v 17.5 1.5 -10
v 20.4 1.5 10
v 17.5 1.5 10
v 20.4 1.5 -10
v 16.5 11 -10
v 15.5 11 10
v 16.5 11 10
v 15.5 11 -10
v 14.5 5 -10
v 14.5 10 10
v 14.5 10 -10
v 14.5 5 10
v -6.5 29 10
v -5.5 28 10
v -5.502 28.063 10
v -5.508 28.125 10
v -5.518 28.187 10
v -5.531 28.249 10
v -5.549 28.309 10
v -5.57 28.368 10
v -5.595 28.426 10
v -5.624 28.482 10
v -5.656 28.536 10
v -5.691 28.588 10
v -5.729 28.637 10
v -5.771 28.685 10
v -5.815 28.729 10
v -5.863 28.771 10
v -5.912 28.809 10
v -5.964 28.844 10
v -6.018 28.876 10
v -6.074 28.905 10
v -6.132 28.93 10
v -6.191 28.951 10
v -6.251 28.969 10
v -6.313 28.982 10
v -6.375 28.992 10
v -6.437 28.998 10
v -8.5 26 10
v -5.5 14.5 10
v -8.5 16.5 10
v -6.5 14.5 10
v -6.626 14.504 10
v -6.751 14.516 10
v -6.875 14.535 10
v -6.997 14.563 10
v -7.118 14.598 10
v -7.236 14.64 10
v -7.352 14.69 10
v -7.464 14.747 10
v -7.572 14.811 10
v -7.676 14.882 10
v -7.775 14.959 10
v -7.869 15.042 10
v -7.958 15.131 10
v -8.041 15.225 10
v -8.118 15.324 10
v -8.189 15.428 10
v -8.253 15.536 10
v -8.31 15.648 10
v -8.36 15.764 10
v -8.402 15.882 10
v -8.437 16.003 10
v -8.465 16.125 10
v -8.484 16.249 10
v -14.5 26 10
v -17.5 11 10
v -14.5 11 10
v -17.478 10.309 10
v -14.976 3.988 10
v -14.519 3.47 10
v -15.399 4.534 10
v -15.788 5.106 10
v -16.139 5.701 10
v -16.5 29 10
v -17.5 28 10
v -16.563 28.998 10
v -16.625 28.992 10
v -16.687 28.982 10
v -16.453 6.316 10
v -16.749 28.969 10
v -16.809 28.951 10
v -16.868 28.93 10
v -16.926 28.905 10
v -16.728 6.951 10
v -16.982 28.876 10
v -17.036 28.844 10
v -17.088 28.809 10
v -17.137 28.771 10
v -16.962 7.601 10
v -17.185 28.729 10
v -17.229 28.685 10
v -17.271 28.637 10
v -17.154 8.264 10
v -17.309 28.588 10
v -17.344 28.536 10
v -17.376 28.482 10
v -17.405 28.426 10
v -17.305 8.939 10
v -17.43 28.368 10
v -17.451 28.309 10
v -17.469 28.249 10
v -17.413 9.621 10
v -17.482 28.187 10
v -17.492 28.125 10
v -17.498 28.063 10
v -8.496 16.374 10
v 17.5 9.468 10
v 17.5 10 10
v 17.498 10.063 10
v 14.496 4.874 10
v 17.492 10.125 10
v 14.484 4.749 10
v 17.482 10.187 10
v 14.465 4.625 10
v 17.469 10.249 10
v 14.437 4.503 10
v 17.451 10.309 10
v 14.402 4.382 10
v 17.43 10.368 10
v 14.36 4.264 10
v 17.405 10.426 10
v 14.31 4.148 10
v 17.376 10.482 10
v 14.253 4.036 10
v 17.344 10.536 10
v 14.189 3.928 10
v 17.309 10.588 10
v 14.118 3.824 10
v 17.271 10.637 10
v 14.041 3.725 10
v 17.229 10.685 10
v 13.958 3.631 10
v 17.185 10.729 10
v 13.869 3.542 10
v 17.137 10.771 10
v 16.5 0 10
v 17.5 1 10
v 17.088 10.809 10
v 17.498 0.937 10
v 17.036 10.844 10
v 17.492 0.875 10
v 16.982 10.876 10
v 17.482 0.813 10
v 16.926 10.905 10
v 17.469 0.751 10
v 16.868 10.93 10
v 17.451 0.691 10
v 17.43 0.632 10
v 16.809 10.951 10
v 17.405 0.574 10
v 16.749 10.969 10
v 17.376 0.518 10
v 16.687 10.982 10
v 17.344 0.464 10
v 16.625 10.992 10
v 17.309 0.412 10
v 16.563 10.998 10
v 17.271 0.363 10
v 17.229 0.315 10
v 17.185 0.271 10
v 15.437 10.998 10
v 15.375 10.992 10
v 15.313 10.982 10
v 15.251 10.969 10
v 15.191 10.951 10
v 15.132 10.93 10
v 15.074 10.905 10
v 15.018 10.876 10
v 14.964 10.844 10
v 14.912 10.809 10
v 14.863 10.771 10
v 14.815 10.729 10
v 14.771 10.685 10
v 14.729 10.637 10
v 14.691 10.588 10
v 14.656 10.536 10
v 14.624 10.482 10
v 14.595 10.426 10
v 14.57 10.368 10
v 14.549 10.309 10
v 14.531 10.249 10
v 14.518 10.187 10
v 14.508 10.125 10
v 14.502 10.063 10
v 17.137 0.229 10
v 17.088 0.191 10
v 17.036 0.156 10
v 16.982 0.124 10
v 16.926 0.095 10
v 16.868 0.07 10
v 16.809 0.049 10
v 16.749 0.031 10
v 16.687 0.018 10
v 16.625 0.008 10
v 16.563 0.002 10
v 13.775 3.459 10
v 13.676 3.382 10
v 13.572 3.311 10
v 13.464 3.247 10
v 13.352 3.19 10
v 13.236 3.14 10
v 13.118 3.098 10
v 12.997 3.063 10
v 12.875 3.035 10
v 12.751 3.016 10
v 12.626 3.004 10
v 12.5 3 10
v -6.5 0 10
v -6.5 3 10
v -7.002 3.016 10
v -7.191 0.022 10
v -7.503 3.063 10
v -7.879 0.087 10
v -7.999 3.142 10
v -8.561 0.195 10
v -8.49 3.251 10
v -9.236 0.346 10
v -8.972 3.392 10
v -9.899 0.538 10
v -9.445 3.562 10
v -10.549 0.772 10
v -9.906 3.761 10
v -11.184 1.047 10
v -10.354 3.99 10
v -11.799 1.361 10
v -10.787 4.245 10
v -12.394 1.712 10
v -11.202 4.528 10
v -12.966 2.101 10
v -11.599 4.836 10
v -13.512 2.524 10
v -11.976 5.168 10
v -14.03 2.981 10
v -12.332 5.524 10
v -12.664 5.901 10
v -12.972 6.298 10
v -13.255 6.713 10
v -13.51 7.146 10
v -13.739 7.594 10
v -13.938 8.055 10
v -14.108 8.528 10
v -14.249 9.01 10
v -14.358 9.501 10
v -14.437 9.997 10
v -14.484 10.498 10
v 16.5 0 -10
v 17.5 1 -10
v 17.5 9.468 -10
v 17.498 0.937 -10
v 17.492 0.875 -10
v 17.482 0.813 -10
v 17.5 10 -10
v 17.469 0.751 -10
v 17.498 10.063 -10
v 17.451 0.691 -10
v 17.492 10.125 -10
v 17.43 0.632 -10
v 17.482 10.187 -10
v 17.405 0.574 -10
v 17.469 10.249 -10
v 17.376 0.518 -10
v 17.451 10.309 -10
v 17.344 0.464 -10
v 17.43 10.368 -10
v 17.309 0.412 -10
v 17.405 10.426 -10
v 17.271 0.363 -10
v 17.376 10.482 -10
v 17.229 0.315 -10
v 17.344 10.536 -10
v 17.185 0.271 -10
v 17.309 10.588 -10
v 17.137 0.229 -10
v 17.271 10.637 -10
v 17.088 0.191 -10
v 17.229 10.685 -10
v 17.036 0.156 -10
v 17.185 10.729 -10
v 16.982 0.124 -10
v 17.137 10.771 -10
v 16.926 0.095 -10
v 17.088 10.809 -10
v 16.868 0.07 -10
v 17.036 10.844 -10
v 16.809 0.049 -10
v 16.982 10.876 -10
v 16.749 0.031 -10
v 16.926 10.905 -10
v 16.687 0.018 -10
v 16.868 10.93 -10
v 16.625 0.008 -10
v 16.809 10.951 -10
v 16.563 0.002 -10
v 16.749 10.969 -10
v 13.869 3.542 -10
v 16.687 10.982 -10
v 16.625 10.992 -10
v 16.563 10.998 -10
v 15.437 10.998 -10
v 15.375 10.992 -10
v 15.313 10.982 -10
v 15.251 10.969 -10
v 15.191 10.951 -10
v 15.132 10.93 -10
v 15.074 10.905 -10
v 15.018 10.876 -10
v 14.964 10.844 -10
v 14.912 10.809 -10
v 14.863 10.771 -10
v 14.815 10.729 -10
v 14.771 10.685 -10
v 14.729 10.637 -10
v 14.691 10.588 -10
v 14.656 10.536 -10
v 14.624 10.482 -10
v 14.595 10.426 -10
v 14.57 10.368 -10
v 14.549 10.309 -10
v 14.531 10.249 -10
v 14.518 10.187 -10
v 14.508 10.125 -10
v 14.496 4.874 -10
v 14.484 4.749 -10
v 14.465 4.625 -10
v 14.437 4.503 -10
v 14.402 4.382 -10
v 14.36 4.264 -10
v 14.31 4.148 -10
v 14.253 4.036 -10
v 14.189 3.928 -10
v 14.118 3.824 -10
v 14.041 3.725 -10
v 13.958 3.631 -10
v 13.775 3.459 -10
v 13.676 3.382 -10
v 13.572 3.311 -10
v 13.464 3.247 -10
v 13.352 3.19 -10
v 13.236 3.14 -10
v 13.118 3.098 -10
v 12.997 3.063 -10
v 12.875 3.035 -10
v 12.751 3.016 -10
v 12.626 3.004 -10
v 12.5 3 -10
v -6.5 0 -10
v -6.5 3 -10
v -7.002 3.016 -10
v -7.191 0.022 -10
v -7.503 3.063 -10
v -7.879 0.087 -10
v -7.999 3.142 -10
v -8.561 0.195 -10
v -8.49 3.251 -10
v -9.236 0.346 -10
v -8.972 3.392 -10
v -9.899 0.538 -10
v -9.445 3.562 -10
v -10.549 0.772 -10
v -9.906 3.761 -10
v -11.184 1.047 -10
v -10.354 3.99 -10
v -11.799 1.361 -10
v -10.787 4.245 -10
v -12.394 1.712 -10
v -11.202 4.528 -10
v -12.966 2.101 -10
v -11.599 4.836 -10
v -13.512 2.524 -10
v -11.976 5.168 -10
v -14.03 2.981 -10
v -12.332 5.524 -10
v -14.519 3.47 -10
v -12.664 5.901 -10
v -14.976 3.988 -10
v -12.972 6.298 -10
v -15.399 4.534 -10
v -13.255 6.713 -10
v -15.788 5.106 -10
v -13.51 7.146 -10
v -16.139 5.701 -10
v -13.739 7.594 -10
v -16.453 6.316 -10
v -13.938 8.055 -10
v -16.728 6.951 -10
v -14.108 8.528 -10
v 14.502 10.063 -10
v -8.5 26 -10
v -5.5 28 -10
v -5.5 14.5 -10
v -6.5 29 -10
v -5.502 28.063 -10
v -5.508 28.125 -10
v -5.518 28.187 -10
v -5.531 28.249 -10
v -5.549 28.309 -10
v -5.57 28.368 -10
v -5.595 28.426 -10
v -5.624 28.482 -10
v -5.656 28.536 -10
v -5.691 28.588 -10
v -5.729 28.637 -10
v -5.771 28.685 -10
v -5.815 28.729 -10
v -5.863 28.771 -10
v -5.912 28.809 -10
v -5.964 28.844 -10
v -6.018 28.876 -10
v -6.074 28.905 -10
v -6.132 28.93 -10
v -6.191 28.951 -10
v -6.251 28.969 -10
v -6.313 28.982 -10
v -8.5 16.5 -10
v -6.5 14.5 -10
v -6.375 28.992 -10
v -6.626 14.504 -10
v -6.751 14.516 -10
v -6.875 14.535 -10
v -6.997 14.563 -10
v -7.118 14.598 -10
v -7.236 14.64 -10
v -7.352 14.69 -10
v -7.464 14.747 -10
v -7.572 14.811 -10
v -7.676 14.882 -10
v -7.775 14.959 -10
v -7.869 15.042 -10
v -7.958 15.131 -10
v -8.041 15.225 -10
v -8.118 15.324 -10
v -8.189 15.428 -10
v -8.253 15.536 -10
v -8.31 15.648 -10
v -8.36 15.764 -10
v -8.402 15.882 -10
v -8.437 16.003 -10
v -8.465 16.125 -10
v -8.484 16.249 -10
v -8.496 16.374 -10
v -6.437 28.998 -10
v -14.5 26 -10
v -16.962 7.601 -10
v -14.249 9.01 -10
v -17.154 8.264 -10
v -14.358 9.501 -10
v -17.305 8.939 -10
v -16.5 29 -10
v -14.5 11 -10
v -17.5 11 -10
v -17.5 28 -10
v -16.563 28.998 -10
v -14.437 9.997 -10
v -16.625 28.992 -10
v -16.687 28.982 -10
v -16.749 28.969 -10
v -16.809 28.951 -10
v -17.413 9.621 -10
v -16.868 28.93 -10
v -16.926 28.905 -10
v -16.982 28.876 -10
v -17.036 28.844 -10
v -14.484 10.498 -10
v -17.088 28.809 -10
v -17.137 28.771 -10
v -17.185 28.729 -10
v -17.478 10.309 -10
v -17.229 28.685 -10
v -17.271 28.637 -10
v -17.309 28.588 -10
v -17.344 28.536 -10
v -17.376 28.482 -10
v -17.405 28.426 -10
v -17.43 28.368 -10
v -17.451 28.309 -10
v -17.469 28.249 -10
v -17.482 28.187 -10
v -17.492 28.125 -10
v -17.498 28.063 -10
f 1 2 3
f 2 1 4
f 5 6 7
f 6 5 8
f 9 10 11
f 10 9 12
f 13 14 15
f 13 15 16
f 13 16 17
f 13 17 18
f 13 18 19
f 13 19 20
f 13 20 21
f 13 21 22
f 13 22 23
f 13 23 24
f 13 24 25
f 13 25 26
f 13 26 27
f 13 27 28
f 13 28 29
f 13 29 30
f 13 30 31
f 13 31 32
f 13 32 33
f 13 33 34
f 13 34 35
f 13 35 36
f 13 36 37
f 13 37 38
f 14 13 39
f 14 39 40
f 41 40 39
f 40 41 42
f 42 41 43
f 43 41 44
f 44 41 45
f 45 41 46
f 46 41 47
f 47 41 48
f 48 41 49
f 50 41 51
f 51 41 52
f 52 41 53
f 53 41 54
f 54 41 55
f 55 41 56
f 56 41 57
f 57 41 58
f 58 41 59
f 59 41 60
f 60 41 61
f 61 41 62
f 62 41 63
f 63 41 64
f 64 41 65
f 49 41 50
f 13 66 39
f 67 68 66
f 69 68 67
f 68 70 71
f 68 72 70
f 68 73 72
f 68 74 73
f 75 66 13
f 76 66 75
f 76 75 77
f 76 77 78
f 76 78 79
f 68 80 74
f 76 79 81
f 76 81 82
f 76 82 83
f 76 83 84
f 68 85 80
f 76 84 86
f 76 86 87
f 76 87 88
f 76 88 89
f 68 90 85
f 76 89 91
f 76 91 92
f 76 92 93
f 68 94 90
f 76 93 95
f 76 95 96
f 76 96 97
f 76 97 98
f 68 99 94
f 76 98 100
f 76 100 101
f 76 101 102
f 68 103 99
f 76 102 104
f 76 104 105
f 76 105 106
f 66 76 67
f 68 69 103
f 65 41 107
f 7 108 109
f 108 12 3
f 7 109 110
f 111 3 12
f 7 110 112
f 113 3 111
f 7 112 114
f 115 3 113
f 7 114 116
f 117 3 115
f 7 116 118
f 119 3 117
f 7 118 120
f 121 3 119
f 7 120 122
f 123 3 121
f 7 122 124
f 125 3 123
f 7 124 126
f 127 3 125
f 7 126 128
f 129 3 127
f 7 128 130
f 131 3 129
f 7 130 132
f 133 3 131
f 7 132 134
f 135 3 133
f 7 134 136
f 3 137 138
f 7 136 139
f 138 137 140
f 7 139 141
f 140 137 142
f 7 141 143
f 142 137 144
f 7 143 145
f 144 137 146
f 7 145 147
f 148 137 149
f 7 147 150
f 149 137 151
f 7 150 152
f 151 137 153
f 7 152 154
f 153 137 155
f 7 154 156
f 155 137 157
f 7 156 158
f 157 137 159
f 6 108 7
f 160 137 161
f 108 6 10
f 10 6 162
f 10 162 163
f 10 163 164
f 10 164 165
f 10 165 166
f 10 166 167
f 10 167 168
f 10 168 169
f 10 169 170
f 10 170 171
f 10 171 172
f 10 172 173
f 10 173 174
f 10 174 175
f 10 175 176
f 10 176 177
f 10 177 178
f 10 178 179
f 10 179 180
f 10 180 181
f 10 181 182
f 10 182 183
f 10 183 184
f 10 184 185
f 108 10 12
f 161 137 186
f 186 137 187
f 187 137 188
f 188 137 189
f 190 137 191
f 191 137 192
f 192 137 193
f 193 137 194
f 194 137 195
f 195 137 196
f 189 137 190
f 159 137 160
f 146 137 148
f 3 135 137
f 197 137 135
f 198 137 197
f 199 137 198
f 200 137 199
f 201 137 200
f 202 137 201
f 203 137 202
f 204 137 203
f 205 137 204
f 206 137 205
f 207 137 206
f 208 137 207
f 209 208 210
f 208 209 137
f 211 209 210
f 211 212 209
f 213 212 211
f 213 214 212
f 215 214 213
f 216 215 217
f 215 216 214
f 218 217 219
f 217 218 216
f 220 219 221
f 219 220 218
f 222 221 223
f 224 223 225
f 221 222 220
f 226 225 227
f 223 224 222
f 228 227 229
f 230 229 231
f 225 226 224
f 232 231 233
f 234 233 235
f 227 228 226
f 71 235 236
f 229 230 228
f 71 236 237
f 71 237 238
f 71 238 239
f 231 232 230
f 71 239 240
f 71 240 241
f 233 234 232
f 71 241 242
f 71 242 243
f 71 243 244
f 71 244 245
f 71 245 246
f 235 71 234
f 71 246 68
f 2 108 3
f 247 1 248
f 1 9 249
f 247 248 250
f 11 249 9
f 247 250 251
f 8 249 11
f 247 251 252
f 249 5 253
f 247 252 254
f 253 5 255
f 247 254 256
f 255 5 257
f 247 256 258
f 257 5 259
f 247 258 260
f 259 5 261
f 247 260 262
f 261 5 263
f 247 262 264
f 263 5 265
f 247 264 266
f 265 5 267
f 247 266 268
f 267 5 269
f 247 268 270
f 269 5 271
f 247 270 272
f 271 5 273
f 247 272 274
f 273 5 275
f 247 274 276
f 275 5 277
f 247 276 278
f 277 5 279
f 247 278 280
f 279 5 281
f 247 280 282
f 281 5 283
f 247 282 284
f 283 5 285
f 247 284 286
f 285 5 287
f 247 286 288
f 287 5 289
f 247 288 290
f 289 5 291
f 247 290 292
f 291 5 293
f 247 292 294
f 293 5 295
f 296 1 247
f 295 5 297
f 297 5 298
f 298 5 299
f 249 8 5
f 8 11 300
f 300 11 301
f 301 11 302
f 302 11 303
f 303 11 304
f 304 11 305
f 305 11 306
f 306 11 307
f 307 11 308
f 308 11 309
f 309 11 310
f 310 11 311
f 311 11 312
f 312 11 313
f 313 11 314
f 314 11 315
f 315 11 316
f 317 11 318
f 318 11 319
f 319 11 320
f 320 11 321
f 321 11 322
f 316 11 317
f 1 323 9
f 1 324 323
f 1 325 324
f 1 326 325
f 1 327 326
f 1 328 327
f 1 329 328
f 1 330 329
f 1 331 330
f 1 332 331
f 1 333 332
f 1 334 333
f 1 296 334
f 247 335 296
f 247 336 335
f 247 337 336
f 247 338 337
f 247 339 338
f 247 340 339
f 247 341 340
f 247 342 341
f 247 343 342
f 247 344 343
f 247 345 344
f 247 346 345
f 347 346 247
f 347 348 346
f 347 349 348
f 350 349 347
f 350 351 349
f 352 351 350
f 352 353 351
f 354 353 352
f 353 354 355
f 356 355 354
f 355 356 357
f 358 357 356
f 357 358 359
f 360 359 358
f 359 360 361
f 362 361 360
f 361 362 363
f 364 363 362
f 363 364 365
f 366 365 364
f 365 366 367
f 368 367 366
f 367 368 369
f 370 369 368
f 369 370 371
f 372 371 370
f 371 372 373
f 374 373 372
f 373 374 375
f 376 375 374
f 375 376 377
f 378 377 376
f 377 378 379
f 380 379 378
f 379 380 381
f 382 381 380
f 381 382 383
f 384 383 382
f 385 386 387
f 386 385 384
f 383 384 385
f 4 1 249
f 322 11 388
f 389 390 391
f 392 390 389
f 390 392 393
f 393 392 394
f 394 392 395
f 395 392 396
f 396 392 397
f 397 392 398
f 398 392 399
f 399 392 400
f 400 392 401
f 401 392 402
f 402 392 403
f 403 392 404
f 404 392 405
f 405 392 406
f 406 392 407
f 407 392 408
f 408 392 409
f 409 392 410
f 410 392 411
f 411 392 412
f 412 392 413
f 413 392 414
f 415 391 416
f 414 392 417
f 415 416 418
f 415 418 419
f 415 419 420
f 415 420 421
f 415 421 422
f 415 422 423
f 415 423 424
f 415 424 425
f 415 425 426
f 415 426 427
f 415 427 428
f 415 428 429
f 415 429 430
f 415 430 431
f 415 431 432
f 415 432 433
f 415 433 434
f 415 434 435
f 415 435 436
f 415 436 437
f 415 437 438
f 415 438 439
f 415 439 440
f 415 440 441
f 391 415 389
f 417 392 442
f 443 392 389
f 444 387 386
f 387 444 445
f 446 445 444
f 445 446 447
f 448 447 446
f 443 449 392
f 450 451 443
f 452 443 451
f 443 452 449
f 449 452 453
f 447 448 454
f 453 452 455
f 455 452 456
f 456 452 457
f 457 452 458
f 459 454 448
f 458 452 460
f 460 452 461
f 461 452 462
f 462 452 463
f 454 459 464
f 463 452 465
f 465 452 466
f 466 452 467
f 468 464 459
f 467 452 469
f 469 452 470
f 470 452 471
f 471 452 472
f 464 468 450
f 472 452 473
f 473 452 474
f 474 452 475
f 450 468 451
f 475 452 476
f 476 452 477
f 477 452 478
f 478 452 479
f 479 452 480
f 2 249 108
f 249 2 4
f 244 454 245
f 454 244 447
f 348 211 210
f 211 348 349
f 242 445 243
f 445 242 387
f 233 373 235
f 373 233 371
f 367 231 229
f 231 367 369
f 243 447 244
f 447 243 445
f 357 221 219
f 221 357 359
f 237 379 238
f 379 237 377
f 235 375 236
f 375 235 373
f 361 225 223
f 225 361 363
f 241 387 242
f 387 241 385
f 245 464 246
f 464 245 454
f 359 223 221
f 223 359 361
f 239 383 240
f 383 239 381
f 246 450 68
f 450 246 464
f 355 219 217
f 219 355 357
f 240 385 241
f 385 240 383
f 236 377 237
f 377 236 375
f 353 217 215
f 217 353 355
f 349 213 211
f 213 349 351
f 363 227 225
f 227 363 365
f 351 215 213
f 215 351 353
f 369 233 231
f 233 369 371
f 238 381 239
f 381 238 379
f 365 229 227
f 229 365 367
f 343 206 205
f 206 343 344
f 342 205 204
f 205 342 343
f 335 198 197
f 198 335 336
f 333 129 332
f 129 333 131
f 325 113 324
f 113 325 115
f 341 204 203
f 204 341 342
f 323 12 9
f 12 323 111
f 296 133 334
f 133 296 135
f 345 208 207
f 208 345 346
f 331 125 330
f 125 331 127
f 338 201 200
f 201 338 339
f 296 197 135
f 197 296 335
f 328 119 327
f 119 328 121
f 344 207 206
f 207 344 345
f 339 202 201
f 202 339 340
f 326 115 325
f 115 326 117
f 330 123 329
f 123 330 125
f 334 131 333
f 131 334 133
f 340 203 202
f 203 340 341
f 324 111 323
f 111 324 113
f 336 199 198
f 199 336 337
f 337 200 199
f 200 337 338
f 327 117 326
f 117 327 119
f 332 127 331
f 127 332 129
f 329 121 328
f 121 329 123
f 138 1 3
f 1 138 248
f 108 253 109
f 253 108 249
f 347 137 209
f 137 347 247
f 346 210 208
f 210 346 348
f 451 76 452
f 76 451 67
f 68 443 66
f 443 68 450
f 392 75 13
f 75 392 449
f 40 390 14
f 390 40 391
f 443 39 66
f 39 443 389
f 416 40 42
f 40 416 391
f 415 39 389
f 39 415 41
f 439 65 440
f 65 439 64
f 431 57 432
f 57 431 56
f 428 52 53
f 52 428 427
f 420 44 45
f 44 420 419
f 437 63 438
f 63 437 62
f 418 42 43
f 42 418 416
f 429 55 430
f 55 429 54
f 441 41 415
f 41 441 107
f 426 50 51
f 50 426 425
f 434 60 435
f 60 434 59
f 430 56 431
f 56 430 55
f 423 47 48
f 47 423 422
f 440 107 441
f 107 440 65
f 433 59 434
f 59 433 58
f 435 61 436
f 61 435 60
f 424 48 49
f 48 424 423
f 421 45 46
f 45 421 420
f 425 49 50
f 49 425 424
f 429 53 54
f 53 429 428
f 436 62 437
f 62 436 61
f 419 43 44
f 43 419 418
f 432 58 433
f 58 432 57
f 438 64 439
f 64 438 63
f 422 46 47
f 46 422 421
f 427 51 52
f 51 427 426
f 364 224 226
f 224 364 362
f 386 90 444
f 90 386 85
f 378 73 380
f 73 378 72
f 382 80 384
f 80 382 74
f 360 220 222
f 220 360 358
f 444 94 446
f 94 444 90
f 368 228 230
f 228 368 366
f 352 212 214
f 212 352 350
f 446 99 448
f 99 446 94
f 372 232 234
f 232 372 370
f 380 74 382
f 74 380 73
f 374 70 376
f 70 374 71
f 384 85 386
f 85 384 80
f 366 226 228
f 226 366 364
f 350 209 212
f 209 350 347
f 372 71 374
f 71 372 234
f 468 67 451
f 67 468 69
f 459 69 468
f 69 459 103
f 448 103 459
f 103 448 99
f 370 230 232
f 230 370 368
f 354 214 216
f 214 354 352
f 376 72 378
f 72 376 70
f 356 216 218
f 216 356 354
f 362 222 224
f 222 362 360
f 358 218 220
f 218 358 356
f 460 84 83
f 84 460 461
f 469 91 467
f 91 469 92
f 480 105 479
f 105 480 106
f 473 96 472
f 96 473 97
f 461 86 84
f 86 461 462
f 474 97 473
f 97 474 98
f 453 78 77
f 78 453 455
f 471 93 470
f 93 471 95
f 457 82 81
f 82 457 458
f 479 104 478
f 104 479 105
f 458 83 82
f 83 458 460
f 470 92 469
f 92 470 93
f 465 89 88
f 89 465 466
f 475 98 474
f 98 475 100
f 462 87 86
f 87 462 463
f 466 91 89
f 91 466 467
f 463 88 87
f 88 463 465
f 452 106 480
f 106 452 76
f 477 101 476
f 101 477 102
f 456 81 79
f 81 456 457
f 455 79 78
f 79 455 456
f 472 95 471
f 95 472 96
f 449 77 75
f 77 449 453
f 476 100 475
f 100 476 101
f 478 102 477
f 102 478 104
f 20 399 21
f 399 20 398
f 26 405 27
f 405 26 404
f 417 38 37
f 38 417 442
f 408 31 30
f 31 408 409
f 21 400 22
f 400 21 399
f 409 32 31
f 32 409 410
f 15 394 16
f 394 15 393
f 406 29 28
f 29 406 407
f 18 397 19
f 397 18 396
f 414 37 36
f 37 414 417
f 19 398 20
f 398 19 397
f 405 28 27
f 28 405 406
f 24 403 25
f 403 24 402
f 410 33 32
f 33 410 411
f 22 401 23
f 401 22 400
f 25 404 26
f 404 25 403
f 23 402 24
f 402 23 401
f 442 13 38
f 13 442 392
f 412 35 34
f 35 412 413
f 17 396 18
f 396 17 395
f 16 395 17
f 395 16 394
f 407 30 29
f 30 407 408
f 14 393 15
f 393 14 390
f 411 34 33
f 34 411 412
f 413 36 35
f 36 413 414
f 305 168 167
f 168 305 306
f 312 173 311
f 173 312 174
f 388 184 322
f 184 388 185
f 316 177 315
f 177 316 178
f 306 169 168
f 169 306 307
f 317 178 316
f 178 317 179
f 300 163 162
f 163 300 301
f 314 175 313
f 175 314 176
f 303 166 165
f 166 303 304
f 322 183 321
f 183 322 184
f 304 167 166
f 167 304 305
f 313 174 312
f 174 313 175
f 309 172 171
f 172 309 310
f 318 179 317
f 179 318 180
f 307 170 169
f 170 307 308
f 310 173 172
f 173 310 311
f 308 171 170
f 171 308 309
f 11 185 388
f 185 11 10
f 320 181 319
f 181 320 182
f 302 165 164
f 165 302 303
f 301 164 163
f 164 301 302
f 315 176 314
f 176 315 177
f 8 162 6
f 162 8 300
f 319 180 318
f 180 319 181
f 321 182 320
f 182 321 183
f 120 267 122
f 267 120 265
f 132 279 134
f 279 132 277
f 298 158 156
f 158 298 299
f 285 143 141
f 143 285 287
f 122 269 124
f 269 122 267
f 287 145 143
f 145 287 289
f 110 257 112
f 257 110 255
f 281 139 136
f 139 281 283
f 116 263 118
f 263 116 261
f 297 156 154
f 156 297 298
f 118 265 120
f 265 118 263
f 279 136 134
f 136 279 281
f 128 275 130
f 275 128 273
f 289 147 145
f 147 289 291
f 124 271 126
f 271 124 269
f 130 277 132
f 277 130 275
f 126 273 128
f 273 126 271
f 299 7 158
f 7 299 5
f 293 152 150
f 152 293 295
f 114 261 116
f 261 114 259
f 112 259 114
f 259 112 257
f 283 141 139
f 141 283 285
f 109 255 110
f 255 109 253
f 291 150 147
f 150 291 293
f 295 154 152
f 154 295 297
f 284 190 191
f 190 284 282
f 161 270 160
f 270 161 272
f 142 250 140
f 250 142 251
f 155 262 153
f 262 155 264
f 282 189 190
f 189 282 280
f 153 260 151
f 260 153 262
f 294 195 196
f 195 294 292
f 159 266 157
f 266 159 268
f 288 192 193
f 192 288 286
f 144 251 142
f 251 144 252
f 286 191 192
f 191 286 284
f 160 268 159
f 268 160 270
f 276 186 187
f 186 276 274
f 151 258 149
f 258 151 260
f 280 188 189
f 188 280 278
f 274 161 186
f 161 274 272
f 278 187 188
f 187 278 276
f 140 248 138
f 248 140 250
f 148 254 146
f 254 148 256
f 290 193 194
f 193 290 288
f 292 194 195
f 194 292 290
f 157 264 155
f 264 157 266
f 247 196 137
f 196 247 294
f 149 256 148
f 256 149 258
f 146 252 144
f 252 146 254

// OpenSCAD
/*
 * Variables for Thingiverse Customizer
 * ==================================================================
 *
 */

// The width of the clips in mm (I use 10 mm and have 4 clips per box)
Clips_Width = 20;


/*
 * Library function: edge
 * ==================================================================
 *
 * Used to make roundes edges on objects
 *
 */
module edge(radius, height)
{
	difference()
	{
		translate([radius/2-0.5, radius/2-0.5, 0])
			cube([radius+1, radius+1, height], center = true);

		translate([radius, radius, 0])
			cylinder(h = height+1, r1 = radius, r2 = radius, center = true, $fn = 100);
	}
}

module ikea_samla_clips(width)
{
	//length = 25;
	length = 35;
    //height = 12;
    height = 23;
    //depth = 4;
    depth = 6;
    //knob = 3;
    knob = 10;
    gh = 3;
	difference()
	{
		union()
		{
			
			translate([0, 0, -3/2])
				cube(size=[length, width, 3], center=true);
		
			translate([length/2-3/2, 0, -(8+3)/2])
				cube(size=[3, width, 8+3], center=true);
		
			difference()
			{
				translate([length/2, 0, -(8+3+1.5)/2])
					cube(size=[6, width, 8+3-1.5], center=true);
			
				translate([length/2+3+1, 0, -(8+3+1.5)/2-1])
				rotate(20, [0, 1, 0])
					cube(size=[6, width+1, 8+3], center=true);
			}
			
			translate([-length/2+3, 0, -3])
			rotate(-90, [1, 0, 0])
				edge(8, width);
		
			translate([-(length/2-3/2), 0, -(height+3+3)/2])
				cube(size=[3, width, height+3+3], center=true);
		
			translate([-(length/2-(3+depth+3)/2), 0, -height-3-3/2])
				cube(size=[3+depth+3, width, 3], center=true);
		
			translate([-(length/2-(3+depth+3)+(gh/2) ), 0, -height-3+knob/2])
				cube(size=[gh, width, knob+3], center=true);
				
			translate([length/2-3, 0, -3])
			rotate(-90, [1, 0, 0])
			rotate(90, [0, 0, 1])
				edge(2, width);				
		}
		
		union()
		{
			translate([-(length/2-(3+depth+3)+gh), 0, -height-3+knob + 3/2])
			rotate(-90, [1, 0, 0])
				edge(2, width+1);

			translate([-length/2, 0, 0])
			rotate(-90, [1, 0, 0])
				edge(8+3, width+1);
				
			translate([-length/2, 0, -height-3-3])
			rotate(-90, [1, 0, 0])
			rotate(-90, [0, 0, 1])
				edge(1, width+1);
			
			translate([-length/2+3+depth+3, 0, -height-3-3])
			rotate(-90, [1, 0, 0])
			rotate(-180, [0, 0, 1])
				edge(1, width+1);


			translate([length/2-3, 0, -8-3])
			rotate(-90, [1, 0, 0])
			rotate(-90, [0, 0, 1])
				edge(1, width+1);
		
			translate([length/2, 0, -8-3])
			rotate(-90, [1, 0, 0])
			rotate(-180, [0, 0, 1])
				edge(1, width+1);
		
			translate([length/2, 0, 0])
			rotate(-90, [1, 0, 0])
			rotate(90, [0, 0, 1])
				edge(1, width+1);
				}	
	}
}
rotate([90,0,0])
ikea_samla_clips(Clips_Width);
